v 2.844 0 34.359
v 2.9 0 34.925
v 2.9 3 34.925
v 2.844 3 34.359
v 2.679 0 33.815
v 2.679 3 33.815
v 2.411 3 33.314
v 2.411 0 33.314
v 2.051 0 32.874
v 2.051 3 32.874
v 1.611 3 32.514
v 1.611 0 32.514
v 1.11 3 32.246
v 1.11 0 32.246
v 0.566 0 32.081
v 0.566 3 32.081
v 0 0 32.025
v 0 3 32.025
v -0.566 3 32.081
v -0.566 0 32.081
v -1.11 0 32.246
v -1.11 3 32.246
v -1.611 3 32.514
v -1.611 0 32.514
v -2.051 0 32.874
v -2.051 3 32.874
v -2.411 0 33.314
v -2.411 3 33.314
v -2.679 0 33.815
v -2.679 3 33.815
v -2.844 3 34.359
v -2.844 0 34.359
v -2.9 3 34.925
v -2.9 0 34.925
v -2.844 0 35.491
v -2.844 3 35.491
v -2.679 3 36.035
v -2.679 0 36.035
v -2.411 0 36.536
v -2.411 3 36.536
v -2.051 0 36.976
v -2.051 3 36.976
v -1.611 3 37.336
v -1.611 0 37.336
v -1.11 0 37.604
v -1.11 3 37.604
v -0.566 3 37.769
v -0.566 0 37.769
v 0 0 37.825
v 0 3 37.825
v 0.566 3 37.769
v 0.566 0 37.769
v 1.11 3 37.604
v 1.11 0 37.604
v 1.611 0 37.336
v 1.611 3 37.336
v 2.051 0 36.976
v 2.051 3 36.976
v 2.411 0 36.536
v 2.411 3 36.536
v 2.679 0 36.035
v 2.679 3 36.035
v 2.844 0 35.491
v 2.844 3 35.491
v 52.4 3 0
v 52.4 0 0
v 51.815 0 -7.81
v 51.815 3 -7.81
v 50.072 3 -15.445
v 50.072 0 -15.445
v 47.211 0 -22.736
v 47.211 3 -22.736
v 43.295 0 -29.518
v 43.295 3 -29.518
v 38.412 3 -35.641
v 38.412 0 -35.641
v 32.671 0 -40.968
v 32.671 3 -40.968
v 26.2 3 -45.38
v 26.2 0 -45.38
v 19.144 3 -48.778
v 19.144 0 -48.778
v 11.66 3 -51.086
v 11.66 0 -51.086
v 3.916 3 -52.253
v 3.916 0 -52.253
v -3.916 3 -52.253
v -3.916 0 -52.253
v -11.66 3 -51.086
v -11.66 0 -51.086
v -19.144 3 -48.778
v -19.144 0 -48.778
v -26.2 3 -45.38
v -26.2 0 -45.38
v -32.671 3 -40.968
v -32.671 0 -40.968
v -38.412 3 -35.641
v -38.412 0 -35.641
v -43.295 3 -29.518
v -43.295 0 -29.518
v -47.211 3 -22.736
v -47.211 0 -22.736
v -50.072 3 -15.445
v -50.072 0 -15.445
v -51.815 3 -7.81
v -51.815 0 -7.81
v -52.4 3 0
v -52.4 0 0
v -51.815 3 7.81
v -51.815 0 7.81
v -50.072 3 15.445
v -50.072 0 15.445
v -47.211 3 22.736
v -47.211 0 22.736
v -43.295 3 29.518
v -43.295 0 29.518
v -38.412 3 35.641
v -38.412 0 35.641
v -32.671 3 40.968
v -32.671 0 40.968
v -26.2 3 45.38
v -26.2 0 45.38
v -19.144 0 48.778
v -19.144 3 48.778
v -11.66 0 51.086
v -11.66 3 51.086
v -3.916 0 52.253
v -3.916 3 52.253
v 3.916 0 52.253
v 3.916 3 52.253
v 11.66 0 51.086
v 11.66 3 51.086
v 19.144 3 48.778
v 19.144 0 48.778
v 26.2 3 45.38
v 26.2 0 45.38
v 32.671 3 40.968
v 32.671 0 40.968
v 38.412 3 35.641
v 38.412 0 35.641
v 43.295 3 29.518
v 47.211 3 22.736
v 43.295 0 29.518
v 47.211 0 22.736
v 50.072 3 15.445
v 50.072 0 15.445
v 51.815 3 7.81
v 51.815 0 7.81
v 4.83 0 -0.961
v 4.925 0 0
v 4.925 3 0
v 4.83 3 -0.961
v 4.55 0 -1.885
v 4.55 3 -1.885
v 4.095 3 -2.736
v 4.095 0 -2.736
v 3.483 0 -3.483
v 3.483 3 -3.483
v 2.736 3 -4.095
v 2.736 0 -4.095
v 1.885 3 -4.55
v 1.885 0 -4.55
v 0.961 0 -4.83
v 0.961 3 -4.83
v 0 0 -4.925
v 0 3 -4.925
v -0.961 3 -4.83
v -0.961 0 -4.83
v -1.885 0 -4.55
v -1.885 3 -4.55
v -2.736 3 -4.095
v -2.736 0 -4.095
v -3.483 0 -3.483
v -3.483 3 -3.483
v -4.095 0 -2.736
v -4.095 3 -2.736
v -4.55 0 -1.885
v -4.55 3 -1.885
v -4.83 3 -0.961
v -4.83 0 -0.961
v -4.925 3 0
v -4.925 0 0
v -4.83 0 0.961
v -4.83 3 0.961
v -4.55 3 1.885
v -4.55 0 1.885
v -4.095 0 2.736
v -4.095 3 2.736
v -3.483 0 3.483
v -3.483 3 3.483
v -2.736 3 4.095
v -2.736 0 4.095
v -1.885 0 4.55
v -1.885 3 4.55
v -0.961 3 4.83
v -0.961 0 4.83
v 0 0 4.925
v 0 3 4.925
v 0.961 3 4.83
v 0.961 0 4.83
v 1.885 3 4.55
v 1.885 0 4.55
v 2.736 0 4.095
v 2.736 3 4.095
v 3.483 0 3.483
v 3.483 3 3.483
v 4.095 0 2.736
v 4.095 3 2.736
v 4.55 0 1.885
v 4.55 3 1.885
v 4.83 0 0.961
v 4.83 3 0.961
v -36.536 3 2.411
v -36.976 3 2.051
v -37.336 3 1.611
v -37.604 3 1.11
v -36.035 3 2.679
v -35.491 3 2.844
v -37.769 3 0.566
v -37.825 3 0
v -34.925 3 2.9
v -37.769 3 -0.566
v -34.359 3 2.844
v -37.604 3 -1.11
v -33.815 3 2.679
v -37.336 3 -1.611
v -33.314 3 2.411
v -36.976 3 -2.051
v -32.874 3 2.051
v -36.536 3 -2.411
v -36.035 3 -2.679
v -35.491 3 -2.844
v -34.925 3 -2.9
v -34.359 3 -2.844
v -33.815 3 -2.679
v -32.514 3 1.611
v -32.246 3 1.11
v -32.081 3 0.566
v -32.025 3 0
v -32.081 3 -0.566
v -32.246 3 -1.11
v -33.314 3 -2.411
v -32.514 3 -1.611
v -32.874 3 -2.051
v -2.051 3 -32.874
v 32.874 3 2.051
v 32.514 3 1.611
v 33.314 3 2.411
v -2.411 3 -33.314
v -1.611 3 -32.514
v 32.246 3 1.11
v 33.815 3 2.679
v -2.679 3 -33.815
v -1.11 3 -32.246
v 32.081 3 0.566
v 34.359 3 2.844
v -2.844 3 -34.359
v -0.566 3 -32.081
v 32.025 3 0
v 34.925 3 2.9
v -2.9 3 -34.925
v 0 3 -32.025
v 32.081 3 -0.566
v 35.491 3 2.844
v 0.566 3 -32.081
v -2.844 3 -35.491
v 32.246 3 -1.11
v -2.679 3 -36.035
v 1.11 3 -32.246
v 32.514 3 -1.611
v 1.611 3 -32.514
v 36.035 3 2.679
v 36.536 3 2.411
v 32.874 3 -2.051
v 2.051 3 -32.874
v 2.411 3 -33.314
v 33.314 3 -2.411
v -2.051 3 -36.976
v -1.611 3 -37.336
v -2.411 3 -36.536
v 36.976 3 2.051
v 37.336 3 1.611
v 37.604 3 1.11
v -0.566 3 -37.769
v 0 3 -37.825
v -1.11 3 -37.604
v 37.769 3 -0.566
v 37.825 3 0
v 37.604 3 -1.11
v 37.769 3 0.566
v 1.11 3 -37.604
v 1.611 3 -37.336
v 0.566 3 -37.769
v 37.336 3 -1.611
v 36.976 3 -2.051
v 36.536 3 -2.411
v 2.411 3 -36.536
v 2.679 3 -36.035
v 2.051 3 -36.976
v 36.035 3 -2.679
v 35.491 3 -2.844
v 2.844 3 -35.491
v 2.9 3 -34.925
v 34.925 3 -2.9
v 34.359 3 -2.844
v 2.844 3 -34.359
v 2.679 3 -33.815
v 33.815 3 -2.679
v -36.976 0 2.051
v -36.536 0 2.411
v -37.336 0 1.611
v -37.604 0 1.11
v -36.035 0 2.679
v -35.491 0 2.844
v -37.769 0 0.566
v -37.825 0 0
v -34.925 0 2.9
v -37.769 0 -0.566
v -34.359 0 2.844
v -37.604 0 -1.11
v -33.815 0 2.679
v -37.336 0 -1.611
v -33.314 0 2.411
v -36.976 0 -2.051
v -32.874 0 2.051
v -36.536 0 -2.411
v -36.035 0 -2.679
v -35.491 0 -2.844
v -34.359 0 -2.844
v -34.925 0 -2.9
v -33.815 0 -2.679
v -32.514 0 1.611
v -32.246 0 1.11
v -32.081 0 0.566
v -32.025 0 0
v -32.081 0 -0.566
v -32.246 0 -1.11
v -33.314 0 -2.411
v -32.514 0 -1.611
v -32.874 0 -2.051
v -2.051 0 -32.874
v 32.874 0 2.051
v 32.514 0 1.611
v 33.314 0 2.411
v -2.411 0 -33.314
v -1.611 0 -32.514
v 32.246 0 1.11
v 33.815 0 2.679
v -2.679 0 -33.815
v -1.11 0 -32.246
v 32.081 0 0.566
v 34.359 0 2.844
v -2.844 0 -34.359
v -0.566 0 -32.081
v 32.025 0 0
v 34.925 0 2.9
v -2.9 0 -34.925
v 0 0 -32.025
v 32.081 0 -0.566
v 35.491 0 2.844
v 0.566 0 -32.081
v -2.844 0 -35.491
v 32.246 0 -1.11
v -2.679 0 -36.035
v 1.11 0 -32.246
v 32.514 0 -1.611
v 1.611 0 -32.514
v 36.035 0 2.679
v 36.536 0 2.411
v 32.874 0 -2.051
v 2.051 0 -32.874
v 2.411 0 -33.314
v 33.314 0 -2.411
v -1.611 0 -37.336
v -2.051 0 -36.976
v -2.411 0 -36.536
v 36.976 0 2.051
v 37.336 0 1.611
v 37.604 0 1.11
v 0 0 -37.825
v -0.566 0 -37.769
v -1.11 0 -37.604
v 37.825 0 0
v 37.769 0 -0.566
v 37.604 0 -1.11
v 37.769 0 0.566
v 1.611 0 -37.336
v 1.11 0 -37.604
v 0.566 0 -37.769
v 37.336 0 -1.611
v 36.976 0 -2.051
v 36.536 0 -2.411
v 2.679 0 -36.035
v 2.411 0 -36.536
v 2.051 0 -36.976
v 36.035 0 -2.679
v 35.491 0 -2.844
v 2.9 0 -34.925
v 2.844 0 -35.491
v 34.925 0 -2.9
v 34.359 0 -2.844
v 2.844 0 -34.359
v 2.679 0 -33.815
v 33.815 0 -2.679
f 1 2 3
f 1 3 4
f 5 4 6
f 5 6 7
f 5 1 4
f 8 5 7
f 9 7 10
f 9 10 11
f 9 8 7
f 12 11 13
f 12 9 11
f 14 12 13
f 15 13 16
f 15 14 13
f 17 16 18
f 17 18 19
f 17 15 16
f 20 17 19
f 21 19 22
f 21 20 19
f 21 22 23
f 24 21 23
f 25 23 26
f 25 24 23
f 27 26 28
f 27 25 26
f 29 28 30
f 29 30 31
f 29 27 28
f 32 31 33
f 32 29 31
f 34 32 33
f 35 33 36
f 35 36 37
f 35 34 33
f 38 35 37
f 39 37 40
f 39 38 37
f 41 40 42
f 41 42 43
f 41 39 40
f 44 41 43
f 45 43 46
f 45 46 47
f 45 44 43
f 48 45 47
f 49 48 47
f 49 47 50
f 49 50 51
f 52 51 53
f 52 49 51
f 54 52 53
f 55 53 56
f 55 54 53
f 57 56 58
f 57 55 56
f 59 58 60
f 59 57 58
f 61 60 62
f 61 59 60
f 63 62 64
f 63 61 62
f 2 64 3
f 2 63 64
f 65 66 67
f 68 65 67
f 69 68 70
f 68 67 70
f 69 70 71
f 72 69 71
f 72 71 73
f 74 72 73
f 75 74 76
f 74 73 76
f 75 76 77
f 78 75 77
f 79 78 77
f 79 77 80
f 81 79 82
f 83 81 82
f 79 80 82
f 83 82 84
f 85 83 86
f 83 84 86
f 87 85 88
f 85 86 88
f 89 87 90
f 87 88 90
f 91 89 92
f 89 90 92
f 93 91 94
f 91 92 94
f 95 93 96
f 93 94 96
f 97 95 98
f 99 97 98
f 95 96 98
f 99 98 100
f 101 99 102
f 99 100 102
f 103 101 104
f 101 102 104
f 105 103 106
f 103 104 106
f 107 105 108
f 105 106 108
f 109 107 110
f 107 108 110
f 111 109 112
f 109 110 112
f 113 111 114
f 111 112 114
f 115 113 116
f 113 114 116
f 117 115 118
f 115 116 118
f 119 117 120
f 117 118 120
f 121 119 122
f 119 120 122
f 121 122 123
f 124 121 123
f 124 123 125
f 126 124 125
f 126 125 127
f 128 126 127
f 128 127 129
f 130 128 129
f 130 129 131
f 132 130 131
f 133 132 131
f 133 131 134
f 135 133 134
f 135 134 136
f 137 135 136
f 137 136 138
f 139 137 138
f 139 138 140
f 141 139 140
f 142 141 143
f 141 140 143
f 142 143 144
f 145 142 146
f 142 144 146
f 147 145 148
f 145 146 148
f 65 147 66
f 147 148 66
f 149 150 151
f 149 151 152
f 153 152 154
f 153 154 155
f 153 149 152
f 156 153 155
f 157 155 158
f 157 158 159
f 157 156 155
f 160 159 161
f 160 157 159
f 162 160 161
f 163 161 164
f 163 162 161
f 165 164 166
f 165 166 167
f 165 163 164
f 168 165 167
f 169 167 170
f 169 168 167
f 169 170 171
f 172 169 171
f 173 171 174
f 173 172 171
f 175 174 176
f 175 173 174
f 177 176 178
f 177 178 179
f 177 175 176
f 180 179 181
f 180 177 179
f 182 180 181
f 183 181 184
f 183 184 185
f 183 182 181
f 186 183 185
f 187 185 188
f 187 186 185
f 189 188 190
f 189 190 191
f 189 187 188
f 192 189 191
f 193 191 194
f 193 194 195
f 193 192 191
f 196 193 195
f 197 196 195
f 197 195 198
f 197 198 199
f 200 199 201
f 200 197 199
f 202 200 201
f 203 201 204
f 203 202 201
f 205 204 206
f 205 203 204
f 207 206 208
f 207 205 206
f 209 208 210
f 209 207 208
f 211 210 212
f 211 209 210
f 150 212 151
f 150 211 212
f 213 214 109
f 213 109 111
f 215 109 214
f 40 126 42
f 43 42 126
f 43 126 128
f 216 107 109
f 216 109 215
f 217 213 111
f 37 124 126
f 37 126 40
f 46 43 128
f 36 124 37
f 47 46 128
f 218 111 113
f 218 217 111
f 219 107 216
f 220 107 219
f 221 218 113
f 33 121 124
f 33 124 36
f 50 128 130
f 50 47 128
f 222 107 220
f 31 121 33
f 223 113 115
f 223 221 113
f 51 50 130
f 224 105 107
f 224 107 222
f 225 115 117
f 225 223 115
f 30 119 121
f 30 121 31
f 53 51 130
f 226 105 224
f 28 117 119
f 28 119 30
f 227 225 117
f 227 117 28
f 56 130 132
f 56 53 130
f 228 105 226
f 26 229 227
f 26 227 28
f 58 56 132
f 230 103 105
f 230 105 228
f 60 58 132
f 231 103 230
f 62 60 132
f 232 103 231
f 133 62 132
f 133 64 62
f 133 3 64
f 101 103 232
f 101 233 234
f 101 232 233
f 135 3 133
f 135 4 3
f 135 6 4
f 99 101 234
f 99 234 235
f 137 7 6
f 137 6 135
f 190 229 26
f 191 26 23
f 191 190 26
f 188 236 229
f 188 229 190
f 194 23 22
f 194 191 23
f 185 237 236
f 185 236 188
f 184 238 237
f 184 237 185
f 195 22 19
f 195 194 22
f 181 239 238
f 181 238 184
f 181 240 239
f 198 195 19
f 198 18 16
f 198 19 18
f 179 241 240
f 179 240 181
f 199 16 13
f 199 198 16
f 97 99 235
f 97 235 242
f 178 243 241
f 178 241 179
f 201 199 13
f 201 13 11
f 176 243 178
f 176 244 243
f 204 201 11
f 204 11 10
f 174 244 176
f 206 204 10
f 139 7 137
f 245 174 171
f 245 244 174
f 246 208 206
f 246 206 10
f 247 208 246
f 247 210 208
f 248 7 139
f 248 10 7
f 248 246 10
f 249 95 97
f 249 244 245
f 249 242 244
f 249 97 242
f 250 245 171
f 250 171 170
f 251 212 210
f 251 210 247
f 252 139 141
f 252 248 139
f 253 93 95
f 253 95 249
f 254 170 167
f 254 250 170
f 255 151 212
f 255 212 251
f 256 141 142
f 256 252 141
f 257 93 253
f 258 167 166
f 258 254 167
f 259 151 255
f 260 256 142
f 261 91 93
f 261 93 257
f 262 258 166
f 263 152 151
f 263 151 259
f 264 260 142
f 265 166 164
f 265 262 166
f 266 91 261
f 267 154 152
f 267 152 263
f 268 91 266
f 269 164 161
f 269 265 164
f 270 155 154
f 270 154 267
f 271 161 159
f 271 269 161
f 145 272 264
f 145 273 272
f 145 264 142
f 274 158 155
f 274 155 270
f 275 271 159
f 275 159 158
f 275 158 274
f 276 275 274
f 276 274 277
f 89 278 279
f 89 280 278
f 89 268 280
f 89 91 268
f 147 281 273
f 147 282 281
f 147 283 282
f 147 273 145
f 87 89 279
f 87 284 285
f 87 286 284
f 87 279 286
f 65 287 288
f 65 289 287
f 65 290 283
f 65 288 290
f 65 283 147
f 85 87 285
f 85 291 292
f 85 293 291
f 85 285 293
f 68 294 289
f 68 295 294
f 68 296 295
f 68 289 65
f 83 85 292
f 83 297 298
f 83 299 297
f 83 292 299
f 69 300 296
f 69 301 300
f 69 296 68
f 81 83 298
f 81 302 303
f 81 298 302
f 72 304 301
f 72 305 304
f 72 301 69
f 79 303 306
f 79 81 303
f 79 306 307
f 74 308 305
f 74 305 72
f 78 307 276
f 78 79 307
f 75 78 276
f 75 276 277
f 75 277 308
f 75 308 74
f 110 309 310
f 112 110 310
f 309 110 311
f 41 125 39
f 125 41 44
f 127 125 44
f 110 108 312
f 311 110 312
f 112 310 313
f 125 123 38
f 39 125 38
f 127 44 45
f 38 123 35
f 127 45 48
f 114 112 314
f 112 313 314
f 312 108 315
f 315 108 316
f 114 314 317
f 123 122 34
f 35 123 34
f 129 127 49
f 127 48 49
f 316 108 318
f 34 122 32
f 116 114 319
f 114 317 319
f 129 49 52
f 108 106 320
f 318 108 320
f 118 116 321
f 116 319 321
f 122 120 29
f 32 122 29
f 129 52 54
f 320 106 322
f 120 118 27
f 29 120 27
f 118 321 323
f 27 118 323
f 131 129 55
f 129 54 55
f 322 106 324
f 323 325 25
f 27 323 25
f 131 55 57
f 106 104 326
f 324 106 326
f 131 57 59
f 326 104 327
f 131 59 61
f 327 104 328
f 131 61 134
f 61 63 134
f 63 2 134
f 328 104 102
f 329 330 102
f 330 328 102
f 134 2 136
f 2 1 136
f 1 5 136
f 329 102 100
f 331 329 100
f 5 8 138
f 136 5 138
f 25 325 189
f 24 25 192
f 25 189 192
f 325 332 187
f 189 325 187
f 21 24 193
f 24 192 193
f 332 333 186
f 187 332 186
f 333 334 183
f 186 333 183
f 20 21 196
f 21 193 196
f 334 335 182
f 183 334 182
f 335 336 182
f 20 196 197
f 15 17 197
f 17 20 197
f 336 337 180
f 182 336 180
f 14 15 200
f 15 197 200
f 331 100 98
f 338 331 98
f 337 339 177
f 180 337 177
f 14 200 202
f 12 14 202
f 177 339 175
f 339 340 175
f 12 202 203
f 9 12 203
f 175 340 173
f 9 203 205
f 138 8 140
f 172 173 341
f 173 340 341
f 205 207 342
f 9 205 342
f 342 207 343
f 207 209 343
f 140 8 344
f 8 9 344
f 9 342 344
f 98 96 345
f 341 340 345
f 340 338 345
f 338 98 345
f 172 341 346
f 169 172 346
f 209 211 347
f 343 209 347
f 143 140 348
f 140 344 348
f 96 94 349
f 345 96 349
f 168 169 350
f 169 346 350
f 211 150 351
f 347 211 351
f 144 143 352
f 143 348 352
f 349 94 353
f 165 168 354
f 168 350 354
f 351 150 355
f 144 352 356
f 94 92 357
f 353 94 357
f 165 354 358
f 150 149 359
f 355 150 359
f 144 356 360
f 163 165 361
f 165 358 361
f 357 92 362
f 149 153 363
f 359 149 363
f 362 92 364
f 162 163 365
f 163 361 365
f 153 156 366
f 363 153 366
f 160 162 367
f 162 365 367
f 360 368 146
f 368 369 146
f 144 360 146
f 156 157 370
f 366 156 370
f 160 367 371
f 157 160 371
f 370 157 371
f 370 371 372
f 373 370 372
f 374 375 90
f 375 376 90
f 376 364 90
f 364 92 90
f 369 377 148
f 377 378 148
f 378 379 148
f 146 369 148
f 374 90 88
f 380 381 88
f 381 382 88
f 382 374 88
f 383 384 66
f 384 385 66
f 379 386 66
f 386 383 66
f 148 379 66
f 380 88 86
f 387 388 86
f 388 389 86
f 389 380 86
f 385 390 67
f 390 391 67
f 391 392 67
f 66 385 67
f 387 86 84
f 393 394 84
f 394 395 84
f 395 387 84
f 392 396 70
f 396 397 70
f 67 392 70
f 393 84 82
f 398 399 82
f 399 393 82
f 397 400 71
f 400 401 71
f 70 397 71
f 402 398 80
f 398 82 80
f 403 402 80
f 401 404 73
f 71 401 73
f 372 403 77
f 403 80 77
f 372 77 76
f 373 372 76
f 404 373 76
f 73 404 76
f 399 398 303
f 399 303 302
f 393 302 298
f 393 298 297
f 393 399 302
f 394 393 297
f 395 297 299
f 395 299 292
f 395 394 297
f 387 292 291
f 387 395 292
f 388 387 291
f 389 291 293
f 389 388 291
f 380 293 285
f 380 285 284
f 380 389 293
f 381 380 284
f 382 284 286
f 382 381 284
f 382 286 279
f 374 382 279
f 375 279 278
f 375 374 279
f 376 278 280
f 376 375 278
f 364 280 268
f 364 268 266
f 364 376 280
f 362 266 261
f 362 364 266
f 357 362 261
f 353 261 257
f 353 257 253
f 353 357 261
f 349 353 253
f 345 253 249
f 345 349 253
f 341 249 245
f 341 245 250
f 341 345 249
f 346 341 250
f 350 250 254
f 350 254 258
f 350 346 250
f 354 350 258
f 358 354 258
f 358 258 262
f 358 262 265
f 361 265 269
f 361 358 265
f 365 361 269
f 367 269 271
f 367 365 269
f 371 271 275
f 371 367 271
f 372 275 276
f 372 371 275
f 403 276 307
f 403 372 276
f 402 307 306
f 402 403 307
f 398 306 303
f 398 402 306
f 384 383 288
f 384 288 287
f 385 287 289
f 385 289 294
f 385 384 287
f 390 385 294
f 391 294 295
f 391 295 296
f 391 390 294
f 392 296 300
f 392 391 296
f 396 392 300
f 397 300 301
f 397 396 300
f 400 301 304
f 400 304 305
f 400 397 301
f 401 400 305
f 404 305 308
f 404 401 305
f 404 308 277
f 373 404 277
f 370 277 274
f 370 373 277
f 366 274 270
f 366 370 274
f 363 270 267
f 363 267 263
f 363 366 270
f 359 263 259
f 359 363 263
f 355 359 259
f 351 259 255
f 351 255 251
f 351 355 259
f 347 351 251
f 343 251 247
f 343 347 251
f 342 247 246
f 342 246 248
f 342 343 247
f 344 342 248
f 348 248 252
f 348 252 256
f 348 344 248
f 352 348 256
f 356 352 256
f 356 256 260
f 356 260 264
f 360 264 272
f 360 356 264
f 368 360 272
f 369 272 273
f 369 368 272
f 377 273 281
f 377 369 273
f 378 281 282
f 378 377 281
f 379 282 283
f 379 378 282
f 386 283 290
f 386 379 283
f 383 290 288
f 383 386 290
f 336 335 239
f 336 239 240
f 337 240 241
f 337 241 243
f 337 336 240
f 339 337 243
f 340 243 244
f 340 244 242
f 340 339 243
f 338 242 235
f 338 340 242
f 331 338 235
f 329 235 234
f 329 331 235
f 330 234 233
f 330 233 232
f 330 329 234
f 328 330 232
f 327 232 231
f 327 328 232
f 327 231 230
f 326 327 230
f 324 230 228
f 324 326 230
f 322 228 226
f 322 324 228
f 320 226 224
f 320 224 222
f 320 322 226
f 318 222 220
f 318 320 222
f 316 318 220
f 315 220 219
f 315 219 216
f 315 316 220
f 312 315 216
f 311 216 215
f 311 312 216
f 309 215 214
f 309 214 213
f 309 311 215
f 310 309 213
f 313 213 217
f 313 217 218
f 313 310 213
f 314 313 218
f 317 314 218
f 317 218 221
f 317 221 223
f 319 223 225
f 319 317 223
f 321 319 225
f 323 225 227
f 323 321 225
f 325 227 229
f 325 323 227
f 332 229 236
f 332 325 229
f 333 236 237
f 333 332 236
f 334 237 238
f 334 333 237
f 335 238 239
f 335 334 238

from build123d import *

# Parameters (mm, degrees)
SKETCH1_R           = 52.4
SKETCH1_R_2         = 4.925
SKETCH1_R_3         = 2.9
BOSS_EXTRUDE1_DEPTH = 3


with BuildPart() as part:
    # Sketch1 → Boss-Extrude1 (new body)
    with BuildSketch(Plane(origin=(0, 0, 0), x_dir=(1, 0, 0), z_dir=(0, 1, 0))):
        Circle(SKETCH1_R)
        Circle(SKETCH1_R_2, mode=Mode.SUBTRACT)
        with Locations((0, 34.925)):
            Circle(SKETCH1_R_3, mode=Mode.SUBTRACT)
        with Locations((34.925, 0)):
            Circle(SKETCH1_R_3, mode=Mode.SUBTRACT)
        with Locations((0, -34.925)):
            Circle(SKETCH1_R_3, mode=Mode.SUBTRACT)
        with Locations((-34.925, 0)):
            Circle(SKETCH1_R_3, mode=Mode.SUBTRACT)
    extrude(amount=BOSS_EXTRUDE1_DEPTH)


solid = part.part
